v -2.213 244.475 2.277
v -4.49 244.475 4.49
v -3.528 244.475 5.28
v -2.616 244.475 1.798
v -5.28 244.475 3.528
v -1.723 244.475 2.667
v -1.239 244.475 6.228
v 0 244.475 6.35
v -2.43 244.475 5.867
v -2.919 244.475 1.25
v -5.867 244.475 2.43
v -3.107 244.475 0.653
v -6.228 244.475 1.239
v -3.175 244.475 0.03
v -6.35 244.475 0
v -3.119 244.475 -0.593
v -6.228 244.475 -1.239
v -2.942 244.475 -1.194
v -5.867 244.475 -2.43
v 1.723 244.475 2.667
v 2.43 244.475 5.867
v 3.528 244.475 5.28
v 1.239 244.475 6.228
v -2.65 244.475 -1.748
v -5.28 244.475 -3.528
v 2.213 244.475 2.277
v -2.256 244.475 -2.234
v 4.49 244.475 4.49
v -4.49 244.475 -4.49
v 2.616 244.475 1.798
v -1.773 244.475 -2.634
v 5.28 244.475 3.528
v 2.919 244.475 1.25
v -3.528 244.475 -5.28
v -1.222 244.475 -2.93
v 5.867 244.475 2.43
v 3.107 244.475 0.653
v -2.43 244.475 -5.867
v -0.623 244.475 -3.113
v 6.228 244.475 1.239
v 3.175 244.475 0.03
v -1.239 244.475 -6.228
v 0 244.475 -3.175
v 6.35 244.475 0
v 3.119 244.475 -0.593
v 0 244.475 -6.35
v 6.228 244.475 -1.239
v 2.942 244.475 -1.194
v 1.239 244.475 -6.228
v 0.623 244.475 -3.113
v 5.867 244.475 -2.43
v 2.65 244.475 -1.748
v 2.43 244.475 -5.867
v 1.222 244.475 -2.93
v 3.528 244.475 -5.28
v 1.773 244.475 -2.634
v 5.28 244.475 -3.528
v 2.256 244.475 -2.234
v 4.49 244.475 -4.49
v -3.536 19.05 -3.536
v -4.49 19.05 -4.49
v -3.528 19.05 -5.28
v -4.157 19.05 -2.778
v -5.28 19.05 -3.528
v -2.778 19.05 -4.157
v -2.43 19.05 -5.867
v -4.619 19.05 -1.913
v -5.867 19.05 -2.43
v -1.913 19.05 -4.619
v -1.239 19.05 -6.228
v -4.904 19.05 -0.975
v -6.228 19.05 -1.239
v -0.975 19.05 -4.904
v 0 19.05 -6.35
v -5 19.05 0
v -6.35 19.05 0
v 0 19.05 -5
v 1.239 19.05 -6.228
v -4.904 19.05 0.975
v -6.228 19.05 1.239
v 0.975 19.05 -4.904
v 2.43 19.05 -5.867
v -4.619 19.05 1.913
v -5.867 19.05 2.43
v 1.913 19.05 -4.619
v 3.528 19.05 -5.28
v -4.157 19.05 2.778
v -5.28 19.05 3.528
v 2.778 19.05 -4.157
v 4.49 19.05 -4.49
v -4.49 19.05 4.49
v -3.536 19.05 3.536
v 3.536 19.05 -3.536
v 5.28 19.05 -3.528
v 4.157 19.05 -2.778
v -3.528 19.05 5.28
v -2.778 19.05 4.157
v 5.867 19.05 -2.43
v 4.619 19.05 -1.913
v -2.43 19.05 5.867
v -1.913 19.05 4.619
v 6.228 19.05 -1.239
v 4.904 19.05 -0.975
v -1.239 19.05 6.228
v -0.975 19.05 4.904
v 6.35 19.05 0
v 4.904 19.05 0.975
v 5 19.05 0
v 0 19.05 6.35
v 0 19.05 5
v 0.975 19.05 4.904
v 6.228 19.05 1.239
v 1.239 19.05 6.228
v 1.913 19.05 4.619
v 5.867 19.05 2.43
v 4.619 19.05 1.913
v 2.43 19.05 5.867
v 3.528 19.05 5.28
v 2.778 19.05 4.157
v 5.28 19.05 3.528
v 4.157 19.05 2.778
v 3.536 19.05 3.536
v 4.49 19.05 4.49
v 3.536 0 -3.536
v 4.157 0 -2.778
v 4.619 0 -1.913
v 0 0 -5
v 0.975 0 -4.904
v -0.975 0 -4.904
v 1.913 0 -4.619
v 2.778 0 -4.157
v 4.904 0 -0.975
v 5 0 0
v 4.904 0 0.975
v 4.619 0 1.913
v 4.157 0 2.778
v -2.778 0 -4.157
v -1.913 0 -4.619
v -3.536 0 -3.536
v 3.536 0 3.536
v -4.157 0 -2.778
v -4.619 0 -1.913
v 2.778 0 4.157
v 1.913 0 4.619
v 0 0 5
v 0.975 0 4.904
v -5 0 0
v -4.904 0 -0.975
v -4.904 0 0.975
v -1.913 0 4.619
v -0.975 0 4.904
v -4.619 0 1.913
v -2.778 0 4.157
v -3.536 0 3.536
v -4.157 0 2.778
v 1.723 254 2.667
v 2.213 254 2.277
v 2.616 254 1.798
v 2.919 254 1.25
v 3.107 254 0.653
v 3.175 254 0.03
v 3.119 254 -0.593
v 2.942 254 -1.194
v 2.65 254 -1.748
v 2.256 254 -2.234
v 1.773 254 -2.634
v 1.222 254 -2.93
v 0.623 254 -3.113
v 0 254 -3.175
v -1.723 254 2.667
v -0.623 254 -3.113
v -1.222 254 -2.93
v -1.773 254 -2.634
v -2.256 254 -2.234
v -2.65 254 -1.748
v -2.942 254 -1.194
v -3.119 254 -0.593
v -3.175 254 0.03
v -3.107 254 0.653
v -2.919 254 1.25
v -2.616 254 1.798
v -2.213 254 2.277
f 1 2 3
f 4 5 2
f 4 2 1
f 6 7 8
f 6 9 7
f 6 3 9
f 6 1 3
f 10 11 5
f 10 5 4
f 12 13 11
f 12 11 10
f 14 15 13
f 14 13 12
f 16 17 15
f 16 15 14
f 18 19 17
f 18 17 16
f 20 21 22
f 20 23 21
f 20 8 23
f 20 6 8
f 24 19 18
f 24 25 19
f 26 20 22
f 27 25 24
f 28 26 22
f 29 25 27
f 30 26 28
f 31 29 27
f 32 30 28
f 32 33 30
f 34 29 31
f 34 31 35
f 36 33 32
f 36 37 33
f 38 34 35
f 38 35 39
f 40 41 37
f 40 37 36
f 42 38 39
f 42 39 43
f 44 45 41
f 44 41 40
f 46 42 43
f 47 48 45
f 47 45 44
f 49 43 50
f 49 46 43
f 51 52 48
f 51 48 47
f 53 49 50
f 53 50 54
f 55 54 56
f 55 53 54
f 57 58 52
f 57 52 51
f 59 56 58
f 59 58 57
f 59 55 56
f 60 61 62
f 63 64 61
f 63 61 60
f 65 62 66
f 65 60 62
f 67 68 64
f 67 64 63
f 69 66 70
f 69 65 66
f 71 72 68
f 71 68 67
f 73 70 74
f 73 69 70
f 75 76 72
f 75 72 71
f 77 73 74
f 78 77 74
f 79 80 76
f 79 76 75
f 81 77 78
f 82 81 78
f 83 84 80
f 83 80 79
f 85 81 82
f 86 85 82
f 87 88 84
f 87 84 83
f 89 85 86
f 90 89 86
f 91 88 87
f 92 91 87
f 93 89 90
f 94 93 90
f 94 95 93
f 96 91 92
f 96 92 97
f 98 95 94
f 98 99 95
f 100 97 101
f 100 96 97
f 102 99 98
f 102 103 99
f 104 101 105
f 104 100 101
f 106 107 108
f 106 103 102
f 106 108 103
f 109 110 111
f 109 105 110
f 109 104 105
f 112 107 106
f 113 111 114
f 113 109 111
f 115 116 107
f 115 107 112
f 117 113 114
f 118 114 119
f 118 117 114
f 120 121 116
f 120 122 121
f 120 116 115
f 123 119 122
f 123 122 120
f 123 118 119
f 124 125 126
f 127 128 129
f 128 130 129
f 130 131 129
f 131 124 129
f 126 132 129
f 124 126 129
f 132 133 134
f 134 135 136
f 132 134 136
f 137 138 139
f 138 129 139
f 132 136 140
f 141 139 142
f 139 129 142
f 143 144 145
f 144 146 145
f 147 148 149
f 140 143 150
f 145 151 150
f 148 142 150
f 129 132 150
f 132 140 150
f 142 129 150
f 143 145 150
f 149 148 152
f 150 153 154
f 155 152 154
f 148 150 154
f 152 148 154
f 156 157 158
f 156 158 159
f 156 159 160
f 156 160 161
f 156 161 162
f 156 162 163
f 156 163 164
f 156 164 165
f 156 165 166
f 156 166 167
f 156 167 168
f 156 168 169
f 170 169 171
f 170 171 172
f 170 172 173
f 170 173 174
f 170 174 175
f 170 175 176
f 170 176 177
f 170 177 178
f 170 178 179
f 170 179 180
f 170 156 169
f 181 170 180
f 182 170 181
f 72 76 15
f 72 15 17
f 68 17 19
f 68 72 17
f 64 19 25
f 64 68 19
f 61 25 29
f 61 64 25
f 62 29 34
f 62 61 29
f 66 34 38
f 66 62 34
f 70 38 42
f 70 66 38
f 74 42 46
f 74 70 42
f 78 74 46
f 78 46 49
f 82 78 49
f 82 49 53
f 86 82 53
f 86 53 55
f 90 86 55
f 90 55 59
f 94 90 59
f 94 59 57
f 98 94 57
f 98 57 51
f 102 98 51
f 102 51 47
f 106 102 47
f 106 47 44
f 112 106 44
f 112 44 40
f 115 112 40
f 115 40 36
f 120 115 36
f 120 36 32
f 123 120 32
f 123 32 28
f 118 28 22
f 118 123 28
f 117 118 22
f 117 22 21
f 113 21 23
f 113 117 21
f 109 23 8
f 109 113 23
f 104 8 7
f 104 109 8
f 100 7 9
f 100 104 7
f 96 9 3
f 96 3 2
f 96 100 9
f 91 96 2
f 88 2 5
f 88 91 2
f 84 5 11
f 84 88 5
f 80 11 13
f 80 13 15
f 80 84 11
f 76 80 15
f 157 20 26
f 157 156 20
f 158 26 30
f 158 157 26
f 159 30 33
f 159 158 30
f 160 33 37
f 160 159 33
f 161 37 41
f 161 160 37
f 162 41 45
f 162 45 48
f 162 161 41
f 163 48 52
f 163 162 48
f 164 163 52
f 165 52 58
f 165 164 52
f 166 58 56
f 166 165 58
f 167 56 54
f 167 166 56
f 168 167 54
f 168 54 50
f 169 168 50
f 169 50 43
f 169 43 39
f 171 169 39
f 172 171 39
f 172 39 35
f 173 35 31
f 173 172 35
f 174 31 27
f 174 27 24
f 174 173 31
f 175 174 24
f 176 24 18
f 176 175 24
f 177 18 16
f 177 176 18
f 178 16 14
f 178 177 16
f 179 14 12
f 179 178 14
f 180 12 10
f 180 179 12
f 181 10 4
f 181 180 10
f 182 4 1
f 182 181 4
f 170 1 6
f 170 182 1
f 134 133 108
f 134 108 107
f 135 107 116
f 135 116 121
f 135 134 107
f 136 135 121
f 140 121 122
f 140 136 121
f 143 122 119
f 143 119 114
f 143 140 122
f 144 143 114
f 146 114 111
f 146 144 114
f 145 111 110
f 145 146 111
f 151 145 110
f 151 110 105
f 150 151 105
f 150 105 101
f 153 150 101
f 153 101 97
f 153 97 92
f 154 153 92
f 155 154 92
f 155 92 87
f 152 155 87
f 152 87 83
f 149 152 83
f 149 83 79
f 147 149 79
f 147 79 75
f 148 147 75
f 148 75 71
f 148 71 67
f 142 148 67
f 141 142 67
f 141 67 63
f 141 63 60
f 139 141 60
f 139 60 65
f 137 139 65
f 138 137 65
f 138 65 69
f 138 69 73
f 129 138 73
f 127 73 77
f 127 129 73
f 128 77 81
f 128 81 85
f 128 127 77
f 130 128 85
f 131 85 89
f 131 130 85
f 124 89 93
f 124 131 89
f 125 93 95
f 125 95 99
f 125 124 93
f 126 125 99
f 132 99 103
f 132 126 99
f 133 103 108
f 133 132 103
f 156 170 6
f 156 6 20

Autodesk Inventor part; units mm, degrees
ref_plane "YZ Plane" through (0, 0, 0) normal (1, 0, 0) x (0, 1, 0)
ref_plane "XZ Plane" through (0, 0, 0) normal (0, 1, 0) x (-1, 0, 0)
ref_plane "XY Plane" through (0, 0, 0) normal (0, 0, 1) x (1, 0, 0)
sketch "Sketch1" plane through (0, 0, 0) normal (0, 1, 0) x (-1, 0, 0)
  circle A0 centre (0, 0) radius 6.35
  dimension "d0" = 12.7
extrude "Extrusion1" add sketch "Sketch1" along normal blind 254
thread "Thread1" size "1/2-10" class "2B" standard "Inch Tapping Threads" full length
sketch "Sketch2" plane through (0, 254, 0) normal (0, 1, 0) x (1, 0, 0)
  circle A0 centre (0, 0) radius 6.35 projected
  arc A1 (1.7227, -2.667) -> (-1.7227, -2.667) centre (0, 0) ccw
  line L0 (-1.7227, -2.667) -> (1.7227, -2.667)
  dimension "d5" = 6.35
  dimension "d6" = 2.667
extrude "Extrusion2" cut sketch "Sketch2" against normal blind 9.525
sketch "Sketch3" plane through (0, 0, 0) normal (0, -1, 0) x (1, 0, 0)
  circle A0 centre (0, 0) radius 6.35 projected
  circle A1 centre (0, 0) radius 5
  dimension "d9" = 10
extrude "Extrusion3" cut sketch "Sketch3" against normal blind 19.05
properties part number "acmeScrew"
